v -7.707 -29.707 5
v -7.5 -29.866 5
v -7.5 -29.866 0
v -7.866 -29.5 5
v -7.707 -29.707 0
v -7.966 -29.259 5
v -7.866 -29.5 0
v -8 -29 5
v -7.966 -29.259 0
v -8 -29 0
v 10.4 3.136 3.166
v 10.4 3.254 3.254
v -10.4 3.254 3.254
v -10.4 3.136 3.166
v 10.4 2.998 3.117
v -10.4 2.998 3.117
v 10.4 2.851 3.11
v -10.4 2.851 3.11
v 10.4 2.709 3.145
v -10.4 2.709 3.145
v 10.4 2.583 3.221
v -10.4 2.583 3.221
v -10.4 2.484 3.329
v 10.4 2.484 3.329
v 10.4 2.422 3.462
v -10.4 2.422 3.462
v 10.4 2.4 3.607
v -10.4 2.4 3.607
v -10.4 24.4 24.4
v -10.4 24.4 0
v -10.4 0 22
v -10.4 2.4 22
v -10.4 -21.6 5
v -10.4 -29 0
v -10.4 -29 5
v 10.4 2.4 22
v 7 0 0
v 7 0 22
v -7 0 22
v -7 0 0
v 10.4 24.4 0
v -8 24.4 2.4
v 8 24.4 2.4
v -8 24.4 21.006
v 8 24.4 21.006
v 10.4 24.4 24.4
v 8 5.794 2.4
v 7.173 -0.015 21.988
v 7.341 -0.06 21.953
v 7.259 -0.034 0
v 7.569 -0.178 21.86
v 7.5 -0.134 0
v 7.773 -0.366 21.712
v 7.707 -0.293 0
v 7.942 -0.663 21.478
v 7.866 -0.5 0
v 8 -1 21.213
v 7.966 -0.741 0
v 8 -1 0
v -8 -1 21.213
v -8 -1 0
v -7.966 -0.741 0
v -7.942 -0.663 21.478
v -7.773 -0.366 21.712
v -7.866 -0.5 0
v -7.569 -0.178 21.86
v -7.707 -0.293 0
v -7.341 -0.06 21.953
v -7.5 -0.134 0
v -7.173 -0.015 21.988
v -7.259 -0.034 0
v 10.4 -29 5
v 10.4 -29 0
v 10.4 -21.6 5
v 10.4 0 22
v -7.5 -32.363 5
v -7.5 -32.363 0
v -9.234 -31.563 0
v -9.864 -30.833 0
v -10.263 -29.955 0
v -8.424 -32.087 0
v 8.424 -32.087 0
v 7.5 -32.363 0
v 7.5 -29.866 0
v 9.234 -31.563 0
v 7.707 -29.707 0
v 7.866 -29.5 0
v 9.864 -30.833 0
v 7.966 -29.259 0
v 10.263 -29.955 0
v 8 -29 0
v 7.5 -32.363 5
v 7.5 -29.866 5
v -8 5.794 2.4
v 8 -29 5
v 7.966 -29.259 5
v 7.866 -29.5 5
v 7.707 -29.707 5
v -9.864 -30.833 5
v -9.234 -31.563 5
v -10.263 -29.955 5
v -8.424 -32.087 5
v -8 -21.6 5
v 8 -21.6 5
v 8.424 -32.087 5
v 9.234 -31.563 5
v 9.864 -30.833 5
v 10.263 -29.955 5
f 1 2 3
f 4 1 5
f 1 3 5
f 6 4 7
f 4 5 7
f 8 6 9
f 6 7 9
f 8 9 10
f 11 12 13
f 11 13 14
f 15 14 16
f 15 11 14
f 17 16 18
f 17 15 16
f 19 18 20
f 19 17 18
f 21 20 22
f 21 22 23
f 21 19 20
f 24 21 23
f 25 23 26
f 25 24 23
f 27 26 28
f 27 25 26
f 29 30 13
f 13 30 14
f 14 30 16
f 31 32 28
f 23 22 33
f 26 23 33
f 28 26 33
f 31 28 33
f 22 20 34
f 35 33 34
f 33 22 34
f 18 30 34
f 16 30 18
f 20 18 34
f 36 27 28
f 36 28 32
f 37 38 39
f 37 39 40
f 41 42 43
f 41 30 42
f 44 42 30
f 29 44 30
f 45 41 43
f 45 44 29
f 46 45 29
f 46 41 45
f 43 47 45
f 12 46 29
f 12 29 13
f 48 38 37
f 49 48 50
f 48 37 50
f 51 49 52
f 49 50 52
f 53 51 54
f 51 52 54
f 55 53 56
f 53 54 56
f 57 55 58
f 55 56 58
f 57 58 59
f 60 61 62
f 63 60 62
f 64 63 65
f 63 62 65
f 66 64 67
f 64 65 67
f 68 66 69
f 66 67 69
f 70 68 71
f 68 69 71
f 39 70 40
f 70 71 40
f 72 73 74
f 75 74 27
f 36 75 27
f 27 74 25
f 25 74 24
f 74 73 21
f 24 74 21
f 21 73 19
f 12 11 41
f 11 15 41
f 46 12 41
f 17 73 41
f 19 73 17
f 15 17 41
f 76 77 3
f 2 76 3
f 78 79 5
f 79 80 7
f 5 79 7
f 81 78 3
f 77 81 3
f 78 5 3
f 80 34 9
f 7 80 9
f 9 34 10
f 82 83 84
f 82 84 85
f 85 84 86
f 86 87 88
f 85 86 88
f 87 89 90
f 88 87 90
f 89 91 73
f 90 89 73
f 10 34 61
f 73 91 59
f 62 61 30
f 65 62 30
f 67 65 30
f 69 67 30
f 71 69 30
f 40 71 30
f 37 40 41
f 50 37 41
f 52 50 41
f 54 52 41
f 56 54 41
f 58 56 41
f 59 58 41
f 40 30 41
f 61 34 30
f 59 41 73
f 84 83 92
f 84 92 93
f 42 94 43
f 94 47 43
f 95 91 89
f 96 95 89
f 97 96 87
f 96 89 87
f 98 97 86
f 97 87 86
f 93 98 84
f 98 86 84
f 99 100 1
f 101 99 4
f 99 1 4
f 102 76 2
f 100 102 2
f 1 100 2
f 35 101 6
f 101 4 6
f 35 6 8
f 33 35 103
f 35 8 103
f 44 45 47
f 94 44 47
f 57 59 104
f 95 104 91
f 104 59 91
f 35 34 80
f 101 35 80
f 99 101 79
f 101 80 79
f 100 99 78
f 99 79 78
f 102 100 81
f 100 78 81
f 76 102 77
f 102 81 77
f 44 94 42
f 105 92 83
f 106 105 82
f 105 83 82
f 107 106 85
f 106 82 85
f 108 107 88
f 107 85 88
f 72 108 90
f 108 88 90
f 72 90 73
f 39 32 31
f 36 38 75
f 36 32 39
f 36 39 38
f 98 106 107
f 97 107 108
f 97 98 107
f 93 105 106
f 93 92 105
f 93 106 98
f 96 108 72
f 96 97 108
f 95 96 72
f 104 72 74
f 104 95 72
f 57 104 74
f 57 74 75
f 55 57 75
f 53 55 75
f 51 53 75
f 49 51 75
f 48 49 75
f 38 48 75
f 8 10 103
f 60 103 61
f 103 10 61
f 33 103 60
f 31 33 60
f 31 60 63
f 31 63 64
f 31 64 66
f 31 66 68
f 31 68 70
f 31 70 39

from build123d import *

# Parameters (mm, degrees)
F6_DEPTH       = 10.4
F8_DEPTH       = 22
F9_W           = 15
F9_H           = 3.4
F10_DEPTH      = 24.401
F12_DEPTH      = 10.401
F12_DEPTH_BACK = 10.401
F14_DEPTH      = 8


with BuildPart() as f6:
    # F5 (on Right) → F6 (new body, symmetric)
    with BuildSketch(Plane.YZ):
        with BuildLine():
            Line((24.4, 0), (24.4, 24.4))
            Line((24.4, 24.4), (3.2535533906, 3.2535533906))
            ThreePointArc((3.2535533906, 3.2535533906), (2.7086582838, 3.1451670149), (2.4, 3.6071067812))
            Line((2.4, 3.6071067812), (2.4, 22))
            Line((2.4, 22), (0, 22))
            Line((0, 22), (0, 0))
            Line((0, 0), (24.4, 0))
        make_face()
    extrude(amount=F6_DEPTH, both=True)

    # F7 (on Top) → F8 (join)
    with BuildSketch(Plane.XY):
        with BuildLine():
            Line((-7, 0), (-10.4, 0))
            Line((-10.4, 0), (-10.4, -21.6))
            Line((-10.4, -21.6), (-10.4, -29))
            ThreePointArc((-10.4, -29), (-9.404163056, -31.404163056), (-7, -32.4))
            Line((-7, -32.4), (7, -32.4))
            ThreePointArc((7, -32.4), (9.404163056, -31.404163056), (10.4, -29))
            Line((10.4, -29), (10.4, -21.6))
            Line((10.4, -21.6), (10.4, 0))
            Line((10.4, 0), (7, 0))
            ThreePointArc((7, 0), (7.7071067812, -0.2928932188), (8, -1))
            Line((8, -1), (8, -29))
            ThreePointArc((8, -29), (7.7071067812, -29.7071067812), (7, -30))
            Line((7, -30), (-7, -30))
            ThreePointArc((-7, -30), (-7.7071067812, -29.7071067812), (-8, -29))
            Line((-8, -29), (-8, -1))
            ThreePointArc((-8, -1), (-7.7071067812, -0.2928932188), (-7, 0))
        make_face()
    extrude(amount=F8_DEPTH)

    # F9 (on Top) → F10 (cut, through all)
    with BuildSketch(Plane.XY):
        with Locations((0, -30.7)):
            Rectangle(F9_W, F9_H)
    extrude(amount=F10_DEPTH, mode=Mode.SUBTRACT)

    # F11 (on Right) → F12 (cut, two sides)
    with BuildSketch(Plane.YZ) as f12_sk:
        Polygon((-32.4, 22), (-32.4, 5), (-21.6, 5), (0, 22), align=None)
    extrude(amount=F12_DEPTH, mode=Mode.SUBTRACT)
    extrude(f12_sk.sketch, amount=-F12_DEPTH_BACK, mode=Mode.SUBTRACT)

    # F13 (on Right) → F14 (cut, symmetric)
    with BuildSketch(Plane.YZ):
        Polygon((24.4, 2.4), (24.4, 21.0058874503), (5.7941125497, 2.4), align=None)
    extrude(amount=F14_DEPTH, both=True, mode=Mode.SUBTRACT)


solid = f6.part
